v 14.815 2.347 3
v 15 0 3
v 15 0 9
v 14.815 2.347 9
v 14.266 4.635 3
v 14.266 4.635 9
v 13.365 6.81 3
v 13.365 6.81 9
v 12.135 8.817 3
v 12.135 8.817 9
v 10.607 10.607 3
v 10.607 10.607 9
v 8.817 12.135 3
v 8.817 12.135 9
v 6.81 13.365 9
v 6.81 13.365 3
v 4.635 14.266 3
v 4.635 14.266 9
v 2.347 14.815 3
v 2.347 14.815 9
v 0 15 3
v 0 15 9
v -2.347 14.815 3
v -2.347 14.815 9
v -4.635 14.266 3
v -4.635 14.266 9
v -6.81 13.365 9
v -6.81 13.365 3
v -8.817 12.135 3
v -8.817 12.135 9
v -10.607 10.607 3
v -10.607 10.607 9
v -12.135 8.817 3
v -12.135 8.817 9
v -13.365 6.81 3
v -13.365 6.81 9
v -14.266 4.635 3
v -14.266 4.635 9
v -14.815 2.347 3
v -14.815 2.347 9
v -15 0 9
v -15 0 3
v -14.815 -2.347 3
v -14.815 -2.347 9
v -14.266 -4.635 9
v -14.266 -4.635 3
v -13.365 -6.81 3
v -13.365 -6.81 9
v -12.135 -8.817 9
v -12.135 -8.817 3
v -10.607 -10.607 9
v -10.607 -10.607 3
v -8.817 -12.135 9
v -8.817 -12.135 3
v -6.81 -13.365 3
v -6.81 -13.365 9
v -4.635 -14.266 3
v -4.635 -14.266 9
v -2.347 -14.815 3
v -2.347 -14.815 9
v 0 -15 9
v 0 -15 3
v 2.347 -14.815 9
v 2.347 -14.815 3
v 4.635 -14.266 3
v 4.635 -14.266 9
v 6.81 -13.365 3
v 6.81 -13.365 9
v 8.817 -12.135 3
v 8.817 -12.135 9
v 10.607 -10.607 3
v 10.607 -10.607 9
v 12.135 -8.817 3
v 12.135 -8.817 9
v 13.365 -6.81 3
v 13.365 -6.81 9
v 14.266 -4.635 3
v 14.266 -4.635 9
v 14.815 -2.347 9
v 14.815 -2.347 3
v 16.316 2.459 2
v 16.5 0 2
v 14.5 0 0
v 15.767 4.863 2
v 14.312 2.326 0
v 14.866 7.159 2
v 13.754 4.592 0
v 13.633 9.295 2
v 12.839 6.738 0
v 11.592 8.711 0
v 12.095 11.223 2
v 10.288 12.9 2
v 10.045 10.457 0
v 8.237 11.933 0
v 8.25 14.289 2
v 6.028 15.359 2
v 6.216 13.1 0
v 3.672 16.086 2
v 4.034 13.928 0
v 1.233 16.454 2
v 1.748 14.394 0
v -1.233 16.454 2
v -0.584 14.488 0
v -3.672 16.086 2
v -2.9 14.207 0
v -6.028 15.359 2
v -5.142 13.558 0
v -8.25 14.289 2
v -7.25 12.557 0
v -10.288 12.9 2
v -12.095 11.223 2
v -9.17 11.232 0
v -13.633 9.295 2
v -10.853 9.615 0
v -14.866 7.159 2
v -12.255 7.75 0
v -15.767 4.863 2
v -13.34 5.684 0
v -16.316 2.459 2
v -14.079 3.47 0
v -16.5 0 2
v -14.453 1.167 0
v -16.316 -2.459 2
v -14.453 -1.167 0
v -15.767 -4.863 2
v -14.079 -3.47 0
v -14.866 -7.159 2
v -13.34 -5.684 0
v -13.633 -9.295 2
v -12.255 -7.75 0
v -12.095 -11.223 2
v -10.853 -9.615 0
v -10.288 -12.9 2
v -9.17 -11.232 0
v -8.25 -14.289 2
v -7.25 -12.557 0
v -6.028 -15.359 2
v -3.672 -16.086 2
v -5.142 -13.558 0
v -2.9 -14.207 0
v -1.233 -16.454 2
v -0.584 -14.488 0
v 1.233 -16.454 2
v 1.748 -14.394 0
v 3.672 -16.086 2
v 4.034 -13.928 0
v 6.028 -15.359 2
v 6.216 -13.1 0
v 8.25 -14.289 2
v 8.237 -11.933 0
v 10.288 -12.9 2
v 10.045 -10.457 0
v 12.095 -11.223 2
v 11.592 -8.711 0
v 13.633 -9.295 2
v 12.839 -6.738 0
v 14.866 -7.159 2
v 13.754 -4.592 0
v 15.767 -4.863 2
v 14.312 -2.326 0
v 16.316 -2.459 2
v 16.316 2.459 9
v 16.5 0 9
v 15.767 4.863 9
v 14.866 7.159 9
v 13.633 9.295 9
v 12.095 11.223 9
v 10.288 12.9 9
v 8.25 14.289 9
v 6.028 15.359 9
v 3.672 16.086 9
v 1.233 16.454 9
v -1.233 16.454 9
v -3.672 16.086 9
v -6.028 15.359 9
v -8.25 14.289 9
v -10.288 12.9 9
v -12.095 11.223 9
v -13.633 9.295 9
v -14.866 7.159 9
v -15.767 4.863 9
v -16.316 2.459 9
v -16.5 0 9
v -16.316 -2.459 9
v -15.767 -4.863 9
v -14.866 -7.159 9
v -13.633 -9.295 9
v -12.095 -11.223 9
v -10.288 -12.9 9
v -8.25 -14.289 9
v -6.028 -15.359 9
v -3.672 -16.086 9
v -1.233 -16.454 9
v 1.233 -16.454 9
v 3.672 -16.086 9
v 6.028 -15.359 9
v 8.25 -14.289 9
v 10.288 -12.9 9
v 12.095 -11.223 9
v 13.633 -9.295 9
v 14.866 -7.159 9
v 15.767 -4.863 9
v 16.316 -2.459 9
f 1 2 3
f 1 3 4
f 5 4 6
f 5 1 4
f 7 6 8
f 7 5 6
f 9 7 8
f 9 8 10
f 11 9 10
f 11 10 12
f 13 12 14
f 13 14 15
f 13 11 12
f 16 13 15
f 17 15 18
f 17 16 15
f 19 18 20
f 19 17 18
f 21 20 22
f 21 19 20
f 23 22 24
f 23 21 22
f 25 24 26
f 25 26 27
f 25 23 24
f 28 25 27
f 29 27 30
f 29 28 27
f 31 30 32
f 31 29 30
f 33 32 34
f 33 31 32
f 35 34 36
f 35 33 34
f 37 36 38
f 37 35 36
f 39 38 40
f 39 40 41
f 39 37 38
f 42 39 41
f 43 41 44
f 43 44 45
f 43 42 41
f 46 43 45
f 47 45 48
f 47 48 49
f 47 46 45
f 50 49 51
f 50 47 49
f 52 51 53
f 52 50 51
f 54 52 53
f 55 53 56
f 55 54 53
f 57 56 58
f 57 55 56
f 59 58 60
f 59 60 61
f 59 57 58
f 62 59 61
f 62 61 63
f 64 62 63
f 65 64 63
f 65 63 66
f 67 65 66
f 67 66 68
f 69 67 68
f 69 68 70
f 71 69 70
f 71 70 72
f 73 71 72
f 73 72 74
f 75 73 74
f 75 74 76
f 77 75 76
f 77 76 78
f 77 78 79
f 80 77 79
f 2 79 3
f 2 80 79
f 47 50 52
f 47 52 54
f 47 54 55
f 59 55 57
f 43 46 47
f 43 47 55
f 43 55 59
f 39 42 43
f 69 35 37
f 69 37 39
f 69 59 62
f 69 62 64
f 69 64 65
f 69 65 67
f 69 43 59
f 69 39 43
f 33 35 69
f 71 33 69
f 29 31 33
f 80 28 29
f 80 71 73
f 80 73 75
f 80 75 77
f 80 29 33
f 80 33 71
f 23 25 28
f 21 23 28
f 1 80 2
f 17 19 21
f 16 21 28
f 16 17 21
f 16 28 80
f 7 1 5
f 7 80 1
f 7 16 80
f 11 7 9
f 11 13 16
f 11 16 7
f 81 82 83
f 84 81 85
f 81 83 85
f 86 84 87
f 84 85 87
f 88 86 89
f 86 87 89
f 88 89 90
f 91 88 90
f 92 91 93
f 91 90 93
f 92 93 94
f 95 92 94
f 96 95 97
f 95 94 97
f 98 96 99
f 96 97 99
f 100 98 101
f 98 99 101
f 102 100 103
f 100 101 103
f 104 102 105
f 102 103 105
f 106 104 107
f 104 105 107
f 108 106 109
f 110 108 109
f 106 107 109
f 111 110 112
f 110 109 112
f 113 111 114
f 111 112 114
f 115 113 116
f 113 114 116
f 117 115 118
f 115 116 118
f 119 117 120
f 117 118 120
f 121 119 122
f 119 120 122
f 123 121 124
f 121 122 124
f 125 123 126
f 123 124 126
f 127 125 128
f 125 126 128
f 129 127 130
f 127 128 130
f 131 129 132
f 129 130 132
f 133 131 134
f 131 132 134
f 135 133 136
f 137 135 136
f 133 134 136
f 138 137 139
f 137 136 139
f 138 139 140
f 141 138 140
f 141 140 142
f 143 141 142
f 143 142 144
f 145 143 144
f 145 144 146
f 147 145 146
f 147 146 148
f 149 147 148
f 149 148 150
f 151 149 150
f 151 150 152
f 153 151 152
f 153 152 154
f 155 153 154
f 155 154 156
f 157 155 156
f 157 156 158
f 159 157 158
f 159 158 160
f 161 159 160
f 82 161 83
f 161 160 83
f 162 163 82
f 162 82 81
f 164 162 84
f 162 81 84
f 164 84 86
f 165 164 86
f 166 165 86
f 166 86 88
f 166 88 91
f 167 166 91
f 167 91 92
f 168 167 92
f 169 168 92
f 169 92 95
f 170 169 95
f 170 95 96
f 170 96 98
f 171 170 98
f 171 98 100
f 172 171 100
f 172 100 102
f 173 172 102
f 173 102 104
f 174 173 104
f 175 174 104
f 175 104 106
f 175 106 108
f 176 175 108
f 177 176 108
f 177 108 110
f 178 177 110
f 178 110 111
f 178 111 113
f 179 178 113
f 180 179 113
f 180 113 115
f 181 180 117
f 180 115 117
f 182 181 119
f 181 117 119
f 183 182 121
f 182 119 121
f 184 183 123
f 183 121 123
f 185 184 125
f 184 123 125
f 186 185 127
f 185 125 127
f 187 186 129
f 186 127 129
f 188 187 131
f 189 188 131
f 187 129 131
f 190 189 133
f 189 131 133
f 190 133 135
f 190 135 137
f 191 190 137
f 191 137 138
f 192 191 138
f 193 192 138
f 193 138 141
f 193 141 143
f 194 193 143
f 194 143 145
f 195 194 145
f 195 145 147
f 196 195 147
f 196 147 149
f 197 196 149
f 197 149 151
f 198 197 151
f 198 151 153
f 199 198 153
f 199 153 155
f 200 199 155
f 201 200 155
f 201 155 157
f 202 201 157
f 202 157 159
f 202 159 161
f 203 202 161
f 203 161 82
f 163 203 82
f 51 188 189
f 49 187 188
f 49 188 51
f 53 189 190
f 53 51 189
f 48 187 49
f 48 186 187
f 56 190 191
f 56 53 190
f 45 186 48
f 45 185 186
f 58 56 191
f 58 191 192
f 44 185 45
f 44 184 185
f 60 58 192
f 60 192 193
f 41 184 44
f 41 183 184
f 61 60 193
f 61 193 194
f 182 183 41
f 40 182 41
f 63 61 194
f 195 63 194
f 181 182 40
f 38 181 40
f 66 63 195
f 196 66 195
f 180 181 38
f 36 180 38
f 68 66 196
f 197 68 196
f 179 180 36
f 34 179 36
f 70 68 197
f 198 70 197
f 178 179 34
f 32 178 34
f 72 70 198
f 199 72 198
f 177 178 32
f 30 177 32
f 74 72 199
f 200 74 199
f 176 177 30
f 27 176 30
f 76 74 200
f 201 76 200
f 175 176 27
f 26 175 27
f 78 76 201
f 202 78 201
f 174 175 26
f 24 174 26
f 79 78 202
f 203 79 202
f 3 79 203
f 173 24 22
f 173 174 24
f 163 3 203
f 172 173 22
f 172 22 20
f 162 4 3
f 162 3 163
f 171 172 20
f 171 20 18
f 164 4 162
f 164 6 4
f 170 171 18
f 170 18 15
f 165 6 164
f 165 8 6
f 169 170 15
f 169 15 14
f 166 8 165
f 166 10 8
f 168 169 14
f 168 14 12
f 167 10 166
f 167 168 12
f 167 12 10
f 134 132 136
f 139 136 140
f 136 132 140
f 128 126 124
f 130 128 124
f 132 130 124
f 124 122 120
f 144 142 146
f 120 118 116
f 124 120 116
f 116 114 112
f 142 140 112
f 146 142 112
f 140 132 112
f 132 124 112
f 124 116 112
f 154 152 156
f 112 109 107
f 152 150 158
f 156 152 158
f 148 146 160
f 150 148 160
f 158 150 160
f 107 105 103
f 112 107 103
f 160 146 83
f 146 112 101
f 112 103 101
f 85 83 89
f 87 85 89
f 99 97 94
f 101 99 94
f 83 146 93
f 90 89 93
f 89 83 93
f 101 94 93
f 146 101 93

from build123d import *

# Parameters (mm, degrees)
F0_R     = 16.5
F1_DEPTH = 3
F2_R     = 16.5
F2_R_2   = 15
F3_DEPTH = 6
F4_SIZE  = 2


with BuildPart() as f1:
    # F0 (on Top) → F1 (new body)
    with BuildSketch(Plane.XY):
        Circle(F0_R)
    extrude(amount=F1_DEPTH)

    # F2 (on face) → F3 (join)
    with BuildSketch(Plane.XY.offset(3)):
        Circle(F2_R)
        Circle(F2_R_2, mode=Mode.SUBTRACT)
    extrude(amount=F3_DEPTH)

    # F4
    f4_edges = [f1.edges().sort_by_distance(p)[0] for p in [
        (-16.5, 0, 0),
    ]]
    chamfer(f4_edges, length=F4_SIZE)


solid = f1.part
